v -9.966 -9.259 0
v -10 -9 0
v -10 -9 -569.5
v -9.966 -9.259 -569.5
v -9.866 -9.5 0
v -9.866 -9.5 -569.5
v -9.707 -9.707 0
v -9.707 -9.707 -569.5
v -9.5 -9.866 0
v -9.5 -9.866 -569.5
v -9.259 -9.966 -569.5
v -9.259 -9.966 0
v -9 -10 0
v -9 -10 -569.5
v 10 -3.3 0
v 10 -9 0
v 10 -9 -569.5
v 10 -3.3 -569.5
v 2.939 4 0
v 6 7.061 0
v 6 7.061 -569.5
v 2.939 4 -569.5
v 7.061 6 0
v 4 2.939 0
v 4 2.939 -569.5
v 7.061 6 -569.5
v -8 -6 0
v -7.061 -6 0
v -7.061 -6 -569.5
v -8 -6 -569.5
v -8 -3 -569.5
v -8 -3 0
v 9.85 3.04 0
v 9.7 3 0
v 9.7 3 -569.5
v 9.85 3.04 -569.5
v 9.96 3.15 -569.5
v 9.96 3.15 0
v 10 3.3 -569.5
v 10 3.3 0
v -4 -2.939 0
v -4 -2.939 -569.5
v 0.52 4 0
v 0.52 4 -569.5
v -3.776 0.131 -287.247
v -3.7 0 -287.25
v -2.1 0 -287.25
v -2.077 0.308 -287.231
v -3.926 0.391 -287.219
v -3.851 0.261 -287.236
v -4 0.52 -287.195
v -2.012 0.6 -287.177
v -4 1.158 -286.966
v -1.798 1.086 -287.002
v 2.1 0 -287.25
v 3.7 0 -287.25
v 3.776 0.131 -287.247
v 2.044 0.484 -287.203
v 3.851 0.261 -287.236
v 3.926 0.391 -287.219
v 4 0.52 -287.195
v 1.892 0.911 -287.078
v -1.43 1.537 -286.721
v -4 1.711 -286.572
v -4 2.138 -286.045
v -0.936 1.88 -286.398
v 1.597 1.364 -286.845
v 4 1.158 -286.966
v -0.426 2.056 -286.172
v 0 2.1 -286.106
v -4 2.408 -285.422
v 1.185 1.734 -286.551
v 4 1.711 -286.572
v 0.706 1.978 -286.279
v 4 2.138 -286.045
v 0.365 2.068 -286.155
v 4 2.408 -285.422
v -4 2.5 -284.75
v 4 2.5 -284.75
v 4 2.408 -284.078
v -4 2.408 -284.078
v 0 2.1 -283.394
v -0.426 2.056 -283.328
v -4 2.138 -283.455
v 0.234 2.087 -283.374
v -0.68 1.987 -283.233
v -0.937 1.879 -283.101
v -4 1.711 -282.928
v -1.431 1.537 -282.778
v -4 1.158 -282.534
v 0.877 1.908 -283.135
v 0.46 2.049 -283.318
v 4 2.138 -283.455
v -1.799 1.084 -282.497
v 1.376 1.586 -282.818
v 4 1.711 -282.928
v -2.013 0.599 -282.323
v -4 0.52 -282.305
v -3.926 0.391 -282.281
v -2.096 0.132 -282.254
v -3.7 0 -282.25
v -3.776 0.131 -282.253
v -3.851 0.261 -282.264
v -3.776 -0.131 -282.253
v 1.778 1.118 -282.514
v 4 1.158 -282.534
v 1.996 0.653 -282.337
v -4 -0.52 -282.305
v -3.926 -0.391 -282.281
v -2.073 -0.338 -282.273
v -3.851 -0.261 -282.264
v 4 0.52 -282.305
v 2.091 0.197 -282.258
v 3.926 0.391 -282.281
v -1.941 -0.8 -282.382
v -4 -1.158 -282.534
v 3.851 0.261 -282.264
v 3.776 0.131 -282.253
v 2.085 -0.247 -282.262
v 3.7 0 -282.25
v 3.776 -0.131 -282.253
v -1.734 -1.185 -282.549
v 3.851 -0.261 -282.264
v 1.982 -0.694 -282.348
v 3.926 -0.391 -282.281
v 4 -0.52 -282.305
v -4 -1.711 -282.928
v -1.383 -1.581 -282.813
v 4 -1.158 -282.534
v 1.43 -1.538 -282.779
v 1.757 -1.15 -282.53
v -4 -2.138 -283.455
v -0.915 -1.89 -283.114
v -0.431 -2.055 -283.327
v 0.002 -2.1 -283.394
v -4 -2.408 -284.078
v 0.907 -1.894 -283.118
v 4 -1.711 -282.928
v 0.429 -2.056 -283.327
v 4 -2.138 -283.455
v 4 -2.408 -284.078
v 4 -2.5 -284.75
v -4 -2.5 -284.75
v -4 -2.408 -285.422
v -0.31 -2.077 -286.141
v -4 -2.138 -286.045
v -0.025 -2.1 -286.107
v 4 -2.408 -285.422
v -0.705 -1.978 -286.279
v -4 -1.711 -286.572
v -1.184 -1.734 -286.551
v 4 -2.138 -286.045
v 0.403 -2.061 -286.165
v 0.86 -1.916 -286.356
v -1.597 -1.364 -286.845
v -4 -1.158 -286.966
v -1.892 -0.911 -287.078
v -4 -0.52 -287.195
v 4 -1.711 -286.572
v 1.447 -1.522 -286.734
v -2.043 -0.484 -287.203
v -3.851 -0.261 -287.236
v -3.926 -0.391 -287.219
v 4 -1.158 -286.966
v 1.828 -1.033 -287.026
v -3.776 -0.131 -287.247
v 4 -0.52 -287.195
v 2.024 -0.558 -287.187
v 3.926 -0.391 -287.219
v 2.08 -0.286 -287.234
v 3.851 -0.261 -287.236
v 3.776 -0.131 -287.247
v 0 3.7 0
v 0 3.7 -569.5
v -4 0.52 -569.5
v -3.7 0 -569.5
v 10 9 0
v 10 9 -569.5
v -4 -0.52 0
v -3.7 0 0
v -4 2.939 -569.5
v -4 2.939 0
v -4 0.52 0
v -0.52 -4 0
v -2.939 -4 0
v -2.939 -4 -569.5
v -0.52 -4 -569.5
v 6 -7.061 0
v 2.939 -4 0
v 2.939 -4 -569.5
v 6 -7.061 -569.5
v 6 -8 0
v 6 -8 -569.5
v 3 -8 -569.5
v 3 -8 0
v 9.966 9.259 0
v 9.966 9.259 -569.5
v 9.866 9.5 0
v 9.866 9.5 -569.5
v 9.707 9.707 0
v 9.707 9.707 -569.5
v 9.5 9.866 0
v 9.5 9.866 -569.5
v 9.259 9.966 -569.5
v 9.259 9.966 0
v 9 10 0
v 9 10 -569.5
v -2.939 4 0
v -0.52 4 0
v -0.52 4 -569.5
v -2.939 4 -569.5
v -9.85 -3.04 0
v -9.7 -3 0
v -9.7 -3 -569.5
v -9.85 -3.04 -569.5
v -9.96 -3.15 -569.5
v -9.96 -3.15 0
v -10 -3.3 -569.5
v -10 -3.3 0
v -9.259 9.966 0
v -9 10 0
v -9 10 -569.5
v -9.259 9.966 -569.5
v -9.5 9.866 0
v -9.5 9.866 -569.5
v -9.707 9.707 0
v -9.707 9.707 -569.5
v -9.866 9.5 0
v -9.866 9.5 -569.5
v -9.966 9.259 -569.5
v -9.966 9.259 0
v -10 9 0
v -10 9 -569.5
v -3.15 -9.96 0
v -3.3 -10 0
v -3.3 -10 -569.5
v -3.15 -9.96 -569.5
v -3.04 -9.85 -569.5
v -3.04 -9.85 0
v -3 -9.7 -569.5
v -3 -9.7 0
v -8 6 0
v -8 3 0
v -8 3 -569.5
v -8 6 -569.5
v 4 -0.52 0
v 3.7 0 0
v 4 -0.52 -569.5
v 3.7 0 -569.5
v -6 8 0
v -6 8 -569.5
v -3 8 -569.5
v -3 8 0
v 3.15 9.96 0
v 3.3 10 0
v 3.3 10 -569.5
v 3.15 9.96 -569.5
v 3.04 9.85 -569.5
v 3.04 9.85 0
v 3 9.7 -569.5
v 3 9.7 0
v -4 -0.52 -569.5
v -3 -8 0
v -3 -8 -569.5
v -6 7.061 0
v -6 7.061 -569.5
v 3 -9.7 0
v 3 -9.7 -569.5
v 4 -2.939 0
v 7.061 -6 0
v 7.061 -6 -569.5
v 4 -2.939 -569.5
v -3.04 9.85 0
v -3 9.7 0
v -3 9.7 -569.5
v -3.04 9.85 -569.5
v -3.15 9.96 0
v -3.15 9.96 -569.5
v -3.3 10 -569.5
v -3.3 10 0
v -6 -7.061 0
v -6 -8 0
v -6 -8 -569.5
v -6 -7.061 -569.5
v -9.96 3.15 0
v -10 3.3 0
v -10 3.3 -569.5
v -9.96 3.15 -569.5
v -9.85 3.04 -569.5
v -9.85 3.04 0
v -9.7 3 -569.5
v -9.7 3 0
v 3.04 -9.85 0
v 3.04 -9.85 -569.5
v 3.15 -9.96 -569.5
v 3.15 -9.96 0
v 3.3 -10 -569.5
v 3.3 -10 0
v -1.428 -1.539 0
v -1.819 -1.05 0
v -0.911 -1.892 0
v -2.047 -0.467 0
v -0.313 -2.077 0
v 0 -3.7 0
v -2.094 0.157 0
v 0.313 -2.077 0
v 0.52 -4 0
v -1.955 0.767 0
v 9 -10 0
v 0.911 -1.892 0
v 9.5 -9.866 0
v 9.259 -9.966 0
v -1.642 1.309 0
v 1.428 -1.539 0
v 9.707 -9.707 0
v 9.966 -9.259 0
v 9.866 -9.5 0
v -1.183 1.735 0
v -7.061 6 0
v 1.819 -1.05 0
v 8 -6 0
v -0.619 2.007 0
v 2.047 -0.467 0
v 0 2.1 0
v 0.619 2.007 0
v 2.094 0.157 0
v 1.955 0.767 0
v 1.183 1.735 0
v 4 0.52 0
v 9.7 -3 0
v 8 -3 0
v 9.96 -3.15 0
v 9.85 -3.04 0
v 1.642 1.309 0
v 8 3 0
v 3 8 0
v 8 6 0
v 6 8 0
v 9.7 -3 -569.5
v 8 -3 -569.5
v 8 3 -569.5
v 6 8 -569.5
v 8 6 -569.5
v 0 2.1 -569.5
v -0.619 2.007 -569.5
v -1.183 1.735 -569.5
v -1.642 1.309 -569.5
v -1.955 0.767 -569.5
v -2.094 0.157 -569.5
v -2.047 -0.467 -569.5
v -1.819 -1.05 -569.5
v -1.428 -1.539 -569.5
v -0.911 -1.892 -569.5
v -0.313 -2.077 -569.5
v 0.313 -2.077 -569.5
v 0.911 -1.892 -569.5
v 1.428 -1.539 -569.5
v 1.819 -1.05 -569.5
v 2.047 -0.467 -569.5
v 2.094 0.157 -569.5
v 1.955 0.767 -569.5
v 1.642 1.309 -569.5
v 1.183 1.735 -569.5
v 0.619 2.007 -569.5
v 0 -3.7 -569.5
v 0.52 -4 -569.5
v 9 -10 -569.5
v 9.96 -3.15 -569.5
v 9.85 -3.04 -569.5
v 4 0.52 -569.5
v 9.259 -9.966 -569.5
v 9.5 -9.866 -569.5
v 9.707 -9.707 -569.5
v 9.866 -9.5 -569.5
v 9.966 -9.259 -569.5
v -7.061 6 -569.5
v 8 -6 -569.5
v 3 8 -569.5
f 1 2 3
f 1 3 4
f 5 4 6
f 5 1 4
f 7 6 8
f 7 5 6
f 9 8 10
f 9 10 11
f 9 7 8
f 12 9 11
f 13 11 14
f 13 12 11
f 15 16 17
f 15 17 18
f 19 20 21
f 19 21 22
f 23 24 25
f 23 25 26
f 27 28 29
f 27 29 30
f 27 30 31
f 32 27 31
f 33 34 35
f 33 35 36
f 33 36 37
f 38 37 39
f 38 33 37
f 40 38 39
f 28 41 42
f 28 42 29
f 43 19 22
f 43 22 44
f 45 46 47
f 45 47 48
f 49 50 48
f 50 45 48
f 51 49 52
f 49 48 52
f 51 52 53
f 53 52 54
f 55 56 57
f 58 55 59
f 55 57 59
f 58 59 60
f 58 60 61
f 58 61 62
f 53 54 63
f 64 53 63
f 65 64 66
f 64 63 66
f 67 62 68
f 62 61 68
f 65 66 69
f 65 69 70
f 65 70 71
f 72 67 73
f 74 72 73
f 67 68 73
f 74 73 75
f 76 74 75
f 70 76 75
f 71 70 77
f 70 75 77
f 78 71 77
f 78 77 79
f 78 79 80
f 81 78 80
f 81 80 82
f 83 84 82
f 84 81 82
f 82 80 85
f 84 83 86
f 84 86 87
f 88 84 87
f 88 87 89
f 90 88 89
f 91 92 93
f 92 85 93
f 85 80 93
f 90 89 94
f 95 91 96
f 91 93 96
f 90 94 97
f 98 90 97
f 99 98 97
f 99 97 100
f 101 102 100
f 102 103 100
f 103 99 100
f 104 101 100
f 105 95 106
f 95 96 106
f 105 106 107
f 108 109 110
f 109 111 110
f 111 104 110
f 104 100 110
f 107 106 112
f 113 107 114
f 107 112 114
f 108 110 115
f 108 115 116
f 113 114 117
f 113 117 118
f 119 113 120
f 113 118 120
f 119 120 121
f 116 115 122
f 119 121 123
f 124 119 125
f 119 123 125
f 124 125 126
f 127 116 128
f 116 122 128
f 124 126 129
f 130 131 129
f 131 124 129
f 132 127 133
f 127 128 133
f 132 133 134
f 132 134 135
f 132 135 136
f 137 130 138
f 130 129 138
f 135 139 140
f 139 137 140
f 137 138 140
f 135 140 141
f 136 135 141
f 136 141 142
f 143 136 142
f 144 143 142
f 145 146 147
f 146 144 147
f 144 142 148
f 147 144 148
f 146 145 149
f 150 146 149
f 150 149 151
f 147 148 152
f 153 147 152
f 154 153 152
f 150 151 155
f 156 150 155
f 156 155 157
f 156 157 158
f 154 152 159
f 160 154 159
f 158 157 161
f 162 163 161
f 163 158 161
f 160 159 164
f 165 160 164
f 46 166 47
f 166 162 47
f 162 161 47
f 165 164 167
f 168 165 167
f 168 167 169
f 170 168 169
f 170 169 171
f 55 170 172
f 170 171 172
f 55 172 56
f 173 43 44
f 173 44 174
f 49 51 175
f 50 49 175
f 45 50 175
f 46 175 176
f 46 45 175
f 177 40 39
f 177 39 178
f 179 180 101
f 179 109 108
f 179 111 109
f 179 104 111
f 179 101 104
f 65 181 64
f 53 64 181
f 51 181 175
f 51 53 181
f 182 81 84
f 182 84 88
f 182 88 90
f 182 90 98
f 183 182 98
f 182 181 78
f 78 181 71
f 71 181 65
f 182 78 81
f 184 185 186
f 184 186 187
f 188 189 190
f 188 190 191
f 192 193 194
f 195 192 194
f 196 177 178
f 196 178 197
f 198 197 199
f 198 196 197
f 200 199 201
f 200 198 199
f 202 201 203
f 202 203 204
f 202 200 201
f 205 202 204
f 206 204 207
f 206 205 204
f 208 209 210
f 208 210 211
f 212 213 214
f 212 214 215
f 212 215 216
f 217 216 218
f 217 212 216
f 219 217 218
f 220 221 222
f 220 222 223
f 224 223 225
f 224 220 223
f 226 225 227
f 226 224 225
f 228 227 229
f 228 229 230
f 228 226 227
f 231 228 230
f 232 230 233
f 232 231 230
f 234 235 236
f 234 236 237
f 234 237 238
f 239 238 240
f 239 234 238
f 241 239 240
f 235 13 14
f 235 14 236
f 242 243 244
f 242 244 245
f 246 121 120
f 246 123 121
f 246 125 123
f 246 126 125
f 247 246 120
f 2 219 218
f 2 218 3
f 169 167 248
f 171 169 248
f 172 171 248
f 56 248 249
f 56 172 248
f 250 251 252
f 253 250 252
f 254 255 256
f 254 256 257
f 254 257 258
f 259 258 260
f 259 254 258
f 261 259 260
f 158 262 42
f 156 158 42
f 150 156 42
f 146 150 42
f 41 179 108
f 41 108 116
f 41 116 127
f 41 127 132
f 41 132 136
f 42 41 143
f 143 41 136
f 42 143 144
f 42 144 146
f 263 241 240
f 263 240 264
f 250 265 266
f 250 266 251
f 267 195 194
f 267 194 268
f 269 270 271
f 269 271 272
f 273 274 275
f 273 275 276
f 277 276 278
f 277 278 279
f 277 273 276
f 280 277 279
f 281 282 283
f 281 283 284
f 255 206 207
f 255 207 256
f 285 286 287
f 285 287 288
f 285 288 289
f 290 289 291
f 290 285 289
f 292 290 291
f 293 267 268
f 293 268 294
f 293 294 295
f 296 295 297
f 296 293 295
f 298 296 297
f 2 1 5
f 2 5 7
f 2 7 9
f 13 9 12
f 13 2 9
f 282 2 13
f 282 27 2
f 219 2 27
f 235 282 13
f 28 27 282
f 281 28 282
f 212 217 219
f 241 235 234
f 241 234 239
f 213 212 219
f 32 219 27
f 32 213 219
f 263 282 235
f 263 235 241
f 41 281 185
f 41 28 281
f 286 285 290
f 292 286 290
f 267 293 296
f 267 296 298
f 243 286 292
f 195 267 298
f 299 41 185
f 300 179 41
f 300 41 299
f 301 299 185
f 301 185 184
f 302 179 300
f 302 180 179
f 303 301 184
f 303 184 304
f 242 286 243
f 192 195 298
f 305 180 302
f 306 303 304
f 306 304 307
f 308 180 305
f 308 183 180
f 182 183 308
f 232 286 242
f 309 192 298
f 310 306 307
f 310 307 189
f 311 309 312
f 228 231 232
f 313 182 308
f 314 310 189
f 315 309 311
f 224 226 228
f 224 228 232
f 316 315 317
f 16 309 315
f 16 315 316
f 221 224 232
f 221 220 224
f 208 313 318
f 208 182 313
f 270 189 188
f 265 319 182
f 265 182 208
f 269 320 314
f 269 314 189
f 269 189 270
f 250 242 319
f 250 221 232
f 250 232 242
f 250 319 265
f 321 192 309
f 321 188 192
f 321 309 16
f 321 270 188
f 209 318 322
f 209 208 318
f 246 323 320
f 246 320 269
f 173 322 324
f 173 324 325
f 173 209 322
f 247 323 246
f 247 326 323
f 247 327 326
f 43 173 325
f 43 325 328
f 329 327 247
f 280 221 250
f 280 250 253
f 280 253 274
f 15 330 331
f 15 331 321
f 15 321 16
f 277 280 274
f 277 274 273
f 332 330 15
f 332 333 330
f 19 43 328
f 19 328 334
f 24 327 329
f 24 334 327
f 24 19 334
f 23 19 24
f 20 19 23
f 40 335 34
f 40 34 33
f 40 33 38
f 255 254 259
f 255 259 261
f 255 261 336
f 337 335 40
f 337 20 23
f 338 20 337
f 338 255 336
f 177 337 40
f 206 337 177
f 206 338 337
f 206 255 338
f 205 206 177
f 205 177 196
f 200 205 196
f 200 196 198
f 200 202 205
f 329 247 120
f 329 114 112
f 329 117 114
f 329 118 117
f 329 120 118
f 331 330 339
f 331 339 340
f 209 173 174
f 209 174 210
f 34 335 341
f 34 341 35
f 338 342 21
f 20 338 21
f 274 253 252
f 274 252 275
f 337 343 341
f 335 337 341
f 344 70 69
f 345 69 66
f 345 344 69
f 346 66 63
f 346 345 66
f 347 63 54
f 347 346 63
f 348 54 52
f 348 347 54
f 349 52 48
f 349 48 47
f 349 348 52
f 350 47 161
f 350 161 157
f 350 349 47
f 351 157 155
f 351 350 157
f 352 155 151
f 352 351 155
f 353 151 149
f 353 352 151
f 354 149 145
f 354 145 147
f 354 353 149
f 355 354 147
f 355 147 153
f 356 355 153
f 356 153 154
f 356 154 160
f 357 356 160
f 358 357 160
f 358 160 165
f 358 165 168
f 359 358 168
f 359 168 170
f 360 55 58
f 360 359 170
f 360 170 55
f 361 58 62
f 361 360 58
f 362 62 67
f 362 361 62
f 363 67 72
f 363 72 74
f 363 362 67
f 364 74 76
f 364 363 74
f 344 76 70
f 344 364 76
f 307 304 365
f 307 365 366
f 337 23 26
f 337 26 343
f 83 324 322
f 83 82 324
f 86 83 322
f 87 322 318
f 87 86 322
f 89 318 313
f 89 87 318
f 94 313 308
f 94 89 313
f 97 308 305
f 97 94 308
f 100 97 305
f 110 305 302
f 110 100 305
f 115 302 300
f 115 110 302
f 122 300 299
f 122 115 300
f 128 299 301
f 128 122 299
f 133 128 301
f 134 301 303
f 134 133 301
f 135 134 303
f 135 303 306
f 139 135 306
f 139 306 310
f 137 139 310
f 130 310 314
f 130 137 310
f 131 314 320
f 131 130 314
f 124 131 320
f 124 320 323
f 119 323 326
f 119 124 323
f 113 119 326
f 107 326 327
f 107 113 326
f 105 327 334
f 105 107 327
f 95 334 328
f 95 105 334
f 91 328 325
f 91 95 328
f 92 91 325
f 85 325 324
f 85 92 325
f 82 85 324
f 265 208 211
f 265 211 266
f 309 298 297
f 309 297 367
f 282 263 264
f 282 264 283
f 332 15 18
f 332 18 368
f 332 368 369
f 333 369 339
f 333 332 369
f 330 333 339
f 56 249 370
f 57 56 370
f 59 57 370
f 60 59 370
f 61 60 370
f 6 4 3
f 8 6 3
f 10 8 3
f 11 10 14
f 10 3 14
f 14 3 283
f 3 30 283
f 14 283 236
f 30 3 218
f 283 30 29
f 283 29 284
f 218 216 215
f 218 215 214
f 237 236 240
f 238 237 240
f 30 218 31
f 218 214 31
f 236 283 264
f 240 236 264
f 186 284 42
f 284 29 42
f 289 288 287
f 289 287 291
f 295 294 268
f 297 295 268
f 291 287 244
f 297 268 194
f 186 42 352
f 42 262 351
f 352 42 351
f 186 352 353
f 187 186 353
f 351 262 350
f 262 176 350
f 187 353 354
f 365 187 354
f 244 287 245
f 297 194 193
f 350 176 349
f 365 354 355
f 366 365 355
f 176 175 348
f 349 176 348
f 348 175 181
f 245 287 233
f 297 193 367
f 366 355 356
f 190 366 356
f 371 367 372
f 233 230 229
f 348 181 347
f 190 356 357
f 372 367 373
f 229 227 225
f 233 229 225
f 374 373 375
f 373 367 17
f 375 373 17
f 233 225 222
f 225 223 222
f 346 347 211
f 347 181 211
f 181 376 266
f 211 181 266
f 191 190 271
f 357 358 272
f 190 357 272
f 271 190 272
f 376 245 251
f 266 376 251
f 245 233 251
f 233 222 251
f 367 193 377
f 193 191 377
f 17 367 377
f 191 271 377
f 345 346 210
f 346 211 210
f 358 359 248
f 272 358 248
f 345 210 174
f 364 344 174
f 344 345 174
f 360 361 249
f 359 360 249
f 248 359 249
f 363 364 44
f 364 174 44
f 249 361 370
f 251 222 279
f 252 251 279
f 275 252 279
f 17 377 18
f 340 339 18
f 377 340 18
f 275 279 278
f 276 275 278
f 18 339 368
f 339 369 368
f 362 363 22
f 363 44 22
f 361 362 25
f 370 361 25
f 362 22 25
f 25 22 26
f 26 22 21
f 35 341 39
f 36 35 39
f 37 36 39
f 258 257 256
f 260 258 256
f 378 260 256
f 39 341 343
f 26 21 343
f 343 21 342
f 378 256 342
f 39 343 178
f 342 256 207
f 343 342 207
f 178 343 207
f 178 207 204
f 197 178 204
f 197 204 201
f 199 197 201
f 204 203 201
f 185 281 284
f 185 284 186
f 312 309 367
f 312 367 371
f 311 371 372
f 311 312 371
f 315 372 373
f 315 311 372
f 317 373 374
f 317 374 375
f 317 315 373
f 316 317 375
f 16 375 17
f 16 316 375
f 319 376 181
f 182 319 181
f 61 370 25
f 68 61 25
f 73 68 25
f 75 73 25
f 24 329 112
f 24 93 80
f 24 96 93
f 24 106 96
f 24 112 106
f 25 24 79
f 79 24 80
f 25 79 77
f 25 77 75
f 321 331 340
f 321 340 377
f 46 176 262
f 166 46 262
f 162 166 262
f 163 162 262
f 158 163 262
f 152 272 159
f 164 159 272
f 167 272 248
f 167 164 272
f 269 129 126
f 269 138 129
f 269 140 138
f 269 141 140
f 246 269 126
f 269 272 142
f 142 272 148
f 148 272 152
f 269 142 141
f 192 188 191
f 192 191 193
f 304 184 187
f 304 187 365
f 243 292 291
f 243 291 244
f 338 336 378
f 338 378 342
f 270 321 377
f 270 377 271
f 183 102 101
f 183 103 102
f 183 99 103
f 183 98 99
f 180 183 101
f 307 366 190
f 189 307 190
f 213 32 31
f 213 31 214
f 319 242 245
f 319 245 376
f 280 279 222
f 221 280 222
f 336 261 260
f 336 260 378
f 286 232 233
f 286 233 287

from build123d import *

# Parameters (mm, degrees)
BOSS_EXTRUDE1_DEPTH = 569.5
SKETCH2_W           = 609.5
SKETCH2_H           = 2.1
SKETCH3_R           = 2.5
CUT_EXTRUDE1_DEPTH  = 20


with BuildPart() as part:
    # Sketch1 → Boss-Extrude1 (new body)
    with BuildSketch(Plane.XY):
        with BuildLine():
            Line((-10, 9), (-10, 3.29999995))
            ThreePointArc((-10, 3.29999995), (-9.912132049, 3.087867916), (-9.7, 3))
            Line((-9.7, 3), (-8, 3))
            Line((-8, 3), (-8, 6))
            Line((-8, 6), (-7.060677, 6))
            Line((-7.060677, 6), (-4, 2.93932965))
            Line((-4, 2.93932965), (-4, 0.519615242))
            Line((-4, 0.519615242), (-3.699996283, -6.437e-06))
            Line((-3.699996283, -6.437e-06), (-4, -0.519628117))
            Line((-4, -0.519628117), (-4, -2.93933725))
            Line((-4, -2.93933725), (-7.0606695, -6))
            Line((-7.0606695, -6), (-8, -6))
            Line((-8, -6), (-8, -3))
            Line((-8, -3), (-9.7, -3))
            ThreePointArc((-9.7, -3), (-9.912132049, -3.087867916), (-10, -3.29999995))
            Line((-10, -3.29999995), (-10, -9))
            ThreePointArc((-10, -9), (-9.707106781, -9.707106781), (-9, -10))
            Line((-9, -10), (-3.29999995, -10))
            ThreePointArc((-3.29999995, -10), (-3.087867916, -9.912132049), (-3, -9.7))
            Line((-3, -9.7), (-3, -8))
            Line((-3, -8), (-6, -8))
            Line((-6, -8), (-6, -7.0606515))
            Line((-6, -7.0606515), (-2.9393489, -4))
            Line((-2.9393489, -4), (-0.519615242, -4))
            Line((-0.519615242, -4), (6.437e-06, -3.699996283))
            Line((6.437e-06, -3.699996283), (0.519628117, -4))
            Line((0.519628117, -4), (2.9393227, -4))
            Line((2.9393227, -4), (6, -7.060677))
            Line((6, -7.060677), (6, -8))
            Line((6, -8), (3, -8))
            Line((3, -8), (3, -9.7))
            ThreePointArc((3, -9.7), (3.087867916, -9.912132049), (3.29999995, -10))
            Line((3.29999995, -10), (9, -10))
            ThreePointArc((9, -10), (9.707106781, -9.707106781), (10, -9))
            Line((10, -9), (10, -3.29999995))
            ThreePointArc((10, -3.29999995), (9.912132049, -3.087867916), (9.7, -3))
            Line((9.7, -3), (8, -3))
            Line((8, -3), (8, -6))
            Line((8, -6), (7.0606435, -6))
            Line((7.0606435, -6), (4, -2.9393482))
            Line((4, -2.9393482), (4, -0.519615242))
            Line((4, -0.519615242), (3.699996283, 6.437e-06))
            Line((3.699996283, 6.437e-06), (4, 0.519628117))
            Line((4, 0.519628117), (4, 2.9393401))
            Line((4, 2.9393401), (7.060651, 6))
            Line((7.060651, 6), (8, 6))
            Line((8, 6), (8, 3))
            Line((8, 3), (9.7, 3))
            ThreePointArc((9.7, 3), (9.912132049, 3.087867916), (10, 3.29999995))
            Line((10, 3.29999995), (10, 9))
            ThreePointArc((10, 9), (9.707106781, 9.707106781), (9, 10))
            Line((9, 10), (3.29999995, 10))
            ThreePointArc((3.29999995, 10), (3.087867916, 9.912132049), (3, 9.7))
            Line((3, 9.7), (3, 8))
            Line((3, 8), (6, 8))
            Line((6, 8), (6, 7.060669))
            Line((6, 7.060669), (2.9393308, 4))
            Line((2.9393308, 4), (0.519615242, 4))
            Line((0.519615242, 4), (-6.437e-06, 3.699996283))
            Line((-6.437e-06, 3.699996283), (-0.519628117, 4))
            Line((-0.519628117, 4), (-2.93935655, 4))
            Line((-2.93935655, 4), (-6, 7.0606435))
            Line((-6, 7.0606435), (-6, 8))
            Line((-6, 8), (-3, 8))
            Line((-3, 8), (-3, 9.7))
            ThreePointArc((-3, 9.7), (-3.087867966, 9.912132034), (-3.3, 10))
            Line((-3.3, 10), (-9, 10))
            ThreePointArc((-9, 10), (-9.707106781, 9.707106781), (-10, 9))
        make_face()
    extrude(amount=-BOSS_EXTRUDE1_DEPTH)

    # Sketch2 → Cut-Revolve1 (revolve, cut)
    with BuildSketch(Plane(origin=(0, 0, 0), x_dir=(0, 0, -1), z_dir=(1, 0, 0))):
        with Locations((304.75, 1.05)):
            Rectangle(SKETCH2_W, SKETCH2_H)
    revolve(axis=Axis((0, 0, -609.5), (0, 0, 1)), mode=Mode.SUBTRACT)

    # Sketch3 → Cut-Extrude1 (cut)
    with BuildSketch(Plane(origin=(10, 0, 0), x_dir=(0, 0, -1), z_dir=(1, 0, 0))):
        with Locations((284.75, 0)):
            Circle(SKETCH3_R)
    extrude(amount=-CUT_EXTRUDE1_DEPTH, mode=Mode.SUBTRACT)


solid = part.part
